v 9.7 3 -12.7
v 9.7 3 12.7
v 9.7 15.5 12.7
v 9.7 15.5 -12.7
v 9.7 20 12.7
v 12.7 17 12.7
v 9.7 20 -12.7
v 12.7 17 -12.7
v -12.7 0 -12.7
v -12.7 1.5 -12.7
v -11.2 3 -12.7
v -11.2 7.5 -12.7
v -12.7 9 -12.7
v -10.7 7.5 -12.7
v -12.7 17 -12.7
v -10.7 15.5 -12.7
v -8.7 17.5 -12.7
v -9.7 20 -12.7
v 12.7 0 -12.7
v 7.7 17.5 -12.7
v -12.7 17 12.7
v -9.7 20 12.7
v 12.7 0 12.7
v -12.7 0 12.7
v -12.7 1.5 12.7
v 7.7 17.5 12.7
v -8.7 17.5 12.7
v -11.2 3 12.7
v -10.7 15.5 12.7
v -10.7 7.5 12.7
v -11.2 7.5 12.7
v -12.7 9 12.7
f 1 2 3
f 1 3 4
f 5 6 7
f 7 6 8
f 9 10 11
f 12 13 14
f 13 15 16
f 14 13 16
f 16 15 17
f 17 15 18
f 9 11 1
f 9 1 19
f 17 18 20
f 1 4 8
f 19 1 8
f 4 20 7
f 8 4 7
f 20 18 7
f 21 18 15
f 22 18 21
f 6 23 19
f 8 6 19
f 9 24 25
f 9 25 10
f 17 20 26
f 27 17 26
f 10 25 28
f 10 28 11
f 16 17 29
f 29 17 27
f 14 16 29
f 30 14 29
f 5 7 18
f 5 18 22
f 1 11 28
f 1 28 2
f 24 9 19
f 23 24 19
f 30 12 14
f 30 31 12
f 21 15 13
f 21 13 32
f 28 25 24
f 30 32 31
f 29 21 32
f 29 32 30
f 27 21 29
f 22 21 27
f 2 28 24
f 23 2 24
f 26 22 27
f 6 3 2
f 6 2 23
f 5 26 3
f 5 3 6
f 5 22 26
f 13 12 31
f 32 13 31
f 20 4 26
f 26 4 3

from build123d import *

# Parameters (mm, degrees)
SKETCH1_W           = 25.4
SKETCH1_H           = 25.4
BOSS_EXTRUDE1_DEPTH = 3
SKETCH2_W           = 3
SKETCH2_H           = 25.4
BOSS_EXTRUDE2_DEPTH = 17
SKETCH3_W           = 25.4
SKETCH3_H           = 2.5
BOSS_EXTRUDE3_DEPTH = 22.4
SKETCH4_W           = 2
SKETCH4_H           = 25.4
BOSS_EXTRUDE4_DEPTH = 10
CHAMFER1_SIZE       = 1.5
CHAMFER2_SIZE       = 3
CHAMFER3_SIZE       = 2
CHAMFER4_SIZE       = 1.5


with BuildPart() as part:
    # Sketch1 → Boss-Extrude1 (new body)
    with BuildSketch(Plane(origin=(0, 0, 0), x_dir=(1, 0, 0), z_dir=(0, 1, 0))):
        Rectangle(SKETCH1_W, SKETCH1_H)
    extrude(amount=BOSS_EXTRUDE1_DEPTH)

    # Sketch2 → Boss-Extrude2 (add)
    with BuildSketch(Plane(origin=(0, 3, 0), x_dir=(1, 0, 0), z_dir=(0, 1, 0))):
        with Locations((11.2, 0)):
            Rectangle(SKETCH2_W, SKETCH2_H)
    extrude(amount=BOSS_EXTRUDE2_DEPTH)

    # Sketch3 → Boss-Extrude3 (add)
    with BuildSketch(Plane.ZY.offset(-9.7)):
        with Locations((0, 18.75)):
            Rectangle(SKETCH3_W, SKETCH3_H)
    extrude(amount=BOSS_EXTRUDE3_DEPTH)

    # Sketch4 → Boss-Extrude4 (add)
    with BuildSketch(Plane.XZ.offset(-17.5)):
        with Locations((-11.7, 0)):
            Rectangle(SKETCH4_W, SKETCH4_H)
    extrude(amount=BOSS_EXTRUDE4_DEPTH)

    # Chamfer1
    chamfer1_edges = [part.edges().sort_by_distance(p)[0] for p in [
        (-12.7, 7.5, 0),
    ]]
    chamfer(chamfer1_edges, length=CHAMFER1_SIZE)

    # Chamfer2
    chamfer2_edges = [part.edges().sort_by_distance(p)[0] for p in [
        (12.7, 20, 0),
        (-12.7, 20, 0),
    ]]
    chamfer(chamfer2_edges, length=CHAMFER2_SIZE)

    # Chamfer3
    chamfer3_edges = [part.edges().sort_by_distance(p)[0] for p in [
        (9.7, 17.5, 0),
        (-10.7, 17.5, 0),
    ]]
    chamfer(chamfer3_edges, length=CHAMFER3_SIZE)

    # Chamfer4
    chamfer4_edges = [part.edges().sort_by_distance(p)[0] for p in [
        (-12.7, 3, 0),
    ]]
    chamfer(chamfer4_edges, length=CHAMFER4_SIZE)


solid = part.part
